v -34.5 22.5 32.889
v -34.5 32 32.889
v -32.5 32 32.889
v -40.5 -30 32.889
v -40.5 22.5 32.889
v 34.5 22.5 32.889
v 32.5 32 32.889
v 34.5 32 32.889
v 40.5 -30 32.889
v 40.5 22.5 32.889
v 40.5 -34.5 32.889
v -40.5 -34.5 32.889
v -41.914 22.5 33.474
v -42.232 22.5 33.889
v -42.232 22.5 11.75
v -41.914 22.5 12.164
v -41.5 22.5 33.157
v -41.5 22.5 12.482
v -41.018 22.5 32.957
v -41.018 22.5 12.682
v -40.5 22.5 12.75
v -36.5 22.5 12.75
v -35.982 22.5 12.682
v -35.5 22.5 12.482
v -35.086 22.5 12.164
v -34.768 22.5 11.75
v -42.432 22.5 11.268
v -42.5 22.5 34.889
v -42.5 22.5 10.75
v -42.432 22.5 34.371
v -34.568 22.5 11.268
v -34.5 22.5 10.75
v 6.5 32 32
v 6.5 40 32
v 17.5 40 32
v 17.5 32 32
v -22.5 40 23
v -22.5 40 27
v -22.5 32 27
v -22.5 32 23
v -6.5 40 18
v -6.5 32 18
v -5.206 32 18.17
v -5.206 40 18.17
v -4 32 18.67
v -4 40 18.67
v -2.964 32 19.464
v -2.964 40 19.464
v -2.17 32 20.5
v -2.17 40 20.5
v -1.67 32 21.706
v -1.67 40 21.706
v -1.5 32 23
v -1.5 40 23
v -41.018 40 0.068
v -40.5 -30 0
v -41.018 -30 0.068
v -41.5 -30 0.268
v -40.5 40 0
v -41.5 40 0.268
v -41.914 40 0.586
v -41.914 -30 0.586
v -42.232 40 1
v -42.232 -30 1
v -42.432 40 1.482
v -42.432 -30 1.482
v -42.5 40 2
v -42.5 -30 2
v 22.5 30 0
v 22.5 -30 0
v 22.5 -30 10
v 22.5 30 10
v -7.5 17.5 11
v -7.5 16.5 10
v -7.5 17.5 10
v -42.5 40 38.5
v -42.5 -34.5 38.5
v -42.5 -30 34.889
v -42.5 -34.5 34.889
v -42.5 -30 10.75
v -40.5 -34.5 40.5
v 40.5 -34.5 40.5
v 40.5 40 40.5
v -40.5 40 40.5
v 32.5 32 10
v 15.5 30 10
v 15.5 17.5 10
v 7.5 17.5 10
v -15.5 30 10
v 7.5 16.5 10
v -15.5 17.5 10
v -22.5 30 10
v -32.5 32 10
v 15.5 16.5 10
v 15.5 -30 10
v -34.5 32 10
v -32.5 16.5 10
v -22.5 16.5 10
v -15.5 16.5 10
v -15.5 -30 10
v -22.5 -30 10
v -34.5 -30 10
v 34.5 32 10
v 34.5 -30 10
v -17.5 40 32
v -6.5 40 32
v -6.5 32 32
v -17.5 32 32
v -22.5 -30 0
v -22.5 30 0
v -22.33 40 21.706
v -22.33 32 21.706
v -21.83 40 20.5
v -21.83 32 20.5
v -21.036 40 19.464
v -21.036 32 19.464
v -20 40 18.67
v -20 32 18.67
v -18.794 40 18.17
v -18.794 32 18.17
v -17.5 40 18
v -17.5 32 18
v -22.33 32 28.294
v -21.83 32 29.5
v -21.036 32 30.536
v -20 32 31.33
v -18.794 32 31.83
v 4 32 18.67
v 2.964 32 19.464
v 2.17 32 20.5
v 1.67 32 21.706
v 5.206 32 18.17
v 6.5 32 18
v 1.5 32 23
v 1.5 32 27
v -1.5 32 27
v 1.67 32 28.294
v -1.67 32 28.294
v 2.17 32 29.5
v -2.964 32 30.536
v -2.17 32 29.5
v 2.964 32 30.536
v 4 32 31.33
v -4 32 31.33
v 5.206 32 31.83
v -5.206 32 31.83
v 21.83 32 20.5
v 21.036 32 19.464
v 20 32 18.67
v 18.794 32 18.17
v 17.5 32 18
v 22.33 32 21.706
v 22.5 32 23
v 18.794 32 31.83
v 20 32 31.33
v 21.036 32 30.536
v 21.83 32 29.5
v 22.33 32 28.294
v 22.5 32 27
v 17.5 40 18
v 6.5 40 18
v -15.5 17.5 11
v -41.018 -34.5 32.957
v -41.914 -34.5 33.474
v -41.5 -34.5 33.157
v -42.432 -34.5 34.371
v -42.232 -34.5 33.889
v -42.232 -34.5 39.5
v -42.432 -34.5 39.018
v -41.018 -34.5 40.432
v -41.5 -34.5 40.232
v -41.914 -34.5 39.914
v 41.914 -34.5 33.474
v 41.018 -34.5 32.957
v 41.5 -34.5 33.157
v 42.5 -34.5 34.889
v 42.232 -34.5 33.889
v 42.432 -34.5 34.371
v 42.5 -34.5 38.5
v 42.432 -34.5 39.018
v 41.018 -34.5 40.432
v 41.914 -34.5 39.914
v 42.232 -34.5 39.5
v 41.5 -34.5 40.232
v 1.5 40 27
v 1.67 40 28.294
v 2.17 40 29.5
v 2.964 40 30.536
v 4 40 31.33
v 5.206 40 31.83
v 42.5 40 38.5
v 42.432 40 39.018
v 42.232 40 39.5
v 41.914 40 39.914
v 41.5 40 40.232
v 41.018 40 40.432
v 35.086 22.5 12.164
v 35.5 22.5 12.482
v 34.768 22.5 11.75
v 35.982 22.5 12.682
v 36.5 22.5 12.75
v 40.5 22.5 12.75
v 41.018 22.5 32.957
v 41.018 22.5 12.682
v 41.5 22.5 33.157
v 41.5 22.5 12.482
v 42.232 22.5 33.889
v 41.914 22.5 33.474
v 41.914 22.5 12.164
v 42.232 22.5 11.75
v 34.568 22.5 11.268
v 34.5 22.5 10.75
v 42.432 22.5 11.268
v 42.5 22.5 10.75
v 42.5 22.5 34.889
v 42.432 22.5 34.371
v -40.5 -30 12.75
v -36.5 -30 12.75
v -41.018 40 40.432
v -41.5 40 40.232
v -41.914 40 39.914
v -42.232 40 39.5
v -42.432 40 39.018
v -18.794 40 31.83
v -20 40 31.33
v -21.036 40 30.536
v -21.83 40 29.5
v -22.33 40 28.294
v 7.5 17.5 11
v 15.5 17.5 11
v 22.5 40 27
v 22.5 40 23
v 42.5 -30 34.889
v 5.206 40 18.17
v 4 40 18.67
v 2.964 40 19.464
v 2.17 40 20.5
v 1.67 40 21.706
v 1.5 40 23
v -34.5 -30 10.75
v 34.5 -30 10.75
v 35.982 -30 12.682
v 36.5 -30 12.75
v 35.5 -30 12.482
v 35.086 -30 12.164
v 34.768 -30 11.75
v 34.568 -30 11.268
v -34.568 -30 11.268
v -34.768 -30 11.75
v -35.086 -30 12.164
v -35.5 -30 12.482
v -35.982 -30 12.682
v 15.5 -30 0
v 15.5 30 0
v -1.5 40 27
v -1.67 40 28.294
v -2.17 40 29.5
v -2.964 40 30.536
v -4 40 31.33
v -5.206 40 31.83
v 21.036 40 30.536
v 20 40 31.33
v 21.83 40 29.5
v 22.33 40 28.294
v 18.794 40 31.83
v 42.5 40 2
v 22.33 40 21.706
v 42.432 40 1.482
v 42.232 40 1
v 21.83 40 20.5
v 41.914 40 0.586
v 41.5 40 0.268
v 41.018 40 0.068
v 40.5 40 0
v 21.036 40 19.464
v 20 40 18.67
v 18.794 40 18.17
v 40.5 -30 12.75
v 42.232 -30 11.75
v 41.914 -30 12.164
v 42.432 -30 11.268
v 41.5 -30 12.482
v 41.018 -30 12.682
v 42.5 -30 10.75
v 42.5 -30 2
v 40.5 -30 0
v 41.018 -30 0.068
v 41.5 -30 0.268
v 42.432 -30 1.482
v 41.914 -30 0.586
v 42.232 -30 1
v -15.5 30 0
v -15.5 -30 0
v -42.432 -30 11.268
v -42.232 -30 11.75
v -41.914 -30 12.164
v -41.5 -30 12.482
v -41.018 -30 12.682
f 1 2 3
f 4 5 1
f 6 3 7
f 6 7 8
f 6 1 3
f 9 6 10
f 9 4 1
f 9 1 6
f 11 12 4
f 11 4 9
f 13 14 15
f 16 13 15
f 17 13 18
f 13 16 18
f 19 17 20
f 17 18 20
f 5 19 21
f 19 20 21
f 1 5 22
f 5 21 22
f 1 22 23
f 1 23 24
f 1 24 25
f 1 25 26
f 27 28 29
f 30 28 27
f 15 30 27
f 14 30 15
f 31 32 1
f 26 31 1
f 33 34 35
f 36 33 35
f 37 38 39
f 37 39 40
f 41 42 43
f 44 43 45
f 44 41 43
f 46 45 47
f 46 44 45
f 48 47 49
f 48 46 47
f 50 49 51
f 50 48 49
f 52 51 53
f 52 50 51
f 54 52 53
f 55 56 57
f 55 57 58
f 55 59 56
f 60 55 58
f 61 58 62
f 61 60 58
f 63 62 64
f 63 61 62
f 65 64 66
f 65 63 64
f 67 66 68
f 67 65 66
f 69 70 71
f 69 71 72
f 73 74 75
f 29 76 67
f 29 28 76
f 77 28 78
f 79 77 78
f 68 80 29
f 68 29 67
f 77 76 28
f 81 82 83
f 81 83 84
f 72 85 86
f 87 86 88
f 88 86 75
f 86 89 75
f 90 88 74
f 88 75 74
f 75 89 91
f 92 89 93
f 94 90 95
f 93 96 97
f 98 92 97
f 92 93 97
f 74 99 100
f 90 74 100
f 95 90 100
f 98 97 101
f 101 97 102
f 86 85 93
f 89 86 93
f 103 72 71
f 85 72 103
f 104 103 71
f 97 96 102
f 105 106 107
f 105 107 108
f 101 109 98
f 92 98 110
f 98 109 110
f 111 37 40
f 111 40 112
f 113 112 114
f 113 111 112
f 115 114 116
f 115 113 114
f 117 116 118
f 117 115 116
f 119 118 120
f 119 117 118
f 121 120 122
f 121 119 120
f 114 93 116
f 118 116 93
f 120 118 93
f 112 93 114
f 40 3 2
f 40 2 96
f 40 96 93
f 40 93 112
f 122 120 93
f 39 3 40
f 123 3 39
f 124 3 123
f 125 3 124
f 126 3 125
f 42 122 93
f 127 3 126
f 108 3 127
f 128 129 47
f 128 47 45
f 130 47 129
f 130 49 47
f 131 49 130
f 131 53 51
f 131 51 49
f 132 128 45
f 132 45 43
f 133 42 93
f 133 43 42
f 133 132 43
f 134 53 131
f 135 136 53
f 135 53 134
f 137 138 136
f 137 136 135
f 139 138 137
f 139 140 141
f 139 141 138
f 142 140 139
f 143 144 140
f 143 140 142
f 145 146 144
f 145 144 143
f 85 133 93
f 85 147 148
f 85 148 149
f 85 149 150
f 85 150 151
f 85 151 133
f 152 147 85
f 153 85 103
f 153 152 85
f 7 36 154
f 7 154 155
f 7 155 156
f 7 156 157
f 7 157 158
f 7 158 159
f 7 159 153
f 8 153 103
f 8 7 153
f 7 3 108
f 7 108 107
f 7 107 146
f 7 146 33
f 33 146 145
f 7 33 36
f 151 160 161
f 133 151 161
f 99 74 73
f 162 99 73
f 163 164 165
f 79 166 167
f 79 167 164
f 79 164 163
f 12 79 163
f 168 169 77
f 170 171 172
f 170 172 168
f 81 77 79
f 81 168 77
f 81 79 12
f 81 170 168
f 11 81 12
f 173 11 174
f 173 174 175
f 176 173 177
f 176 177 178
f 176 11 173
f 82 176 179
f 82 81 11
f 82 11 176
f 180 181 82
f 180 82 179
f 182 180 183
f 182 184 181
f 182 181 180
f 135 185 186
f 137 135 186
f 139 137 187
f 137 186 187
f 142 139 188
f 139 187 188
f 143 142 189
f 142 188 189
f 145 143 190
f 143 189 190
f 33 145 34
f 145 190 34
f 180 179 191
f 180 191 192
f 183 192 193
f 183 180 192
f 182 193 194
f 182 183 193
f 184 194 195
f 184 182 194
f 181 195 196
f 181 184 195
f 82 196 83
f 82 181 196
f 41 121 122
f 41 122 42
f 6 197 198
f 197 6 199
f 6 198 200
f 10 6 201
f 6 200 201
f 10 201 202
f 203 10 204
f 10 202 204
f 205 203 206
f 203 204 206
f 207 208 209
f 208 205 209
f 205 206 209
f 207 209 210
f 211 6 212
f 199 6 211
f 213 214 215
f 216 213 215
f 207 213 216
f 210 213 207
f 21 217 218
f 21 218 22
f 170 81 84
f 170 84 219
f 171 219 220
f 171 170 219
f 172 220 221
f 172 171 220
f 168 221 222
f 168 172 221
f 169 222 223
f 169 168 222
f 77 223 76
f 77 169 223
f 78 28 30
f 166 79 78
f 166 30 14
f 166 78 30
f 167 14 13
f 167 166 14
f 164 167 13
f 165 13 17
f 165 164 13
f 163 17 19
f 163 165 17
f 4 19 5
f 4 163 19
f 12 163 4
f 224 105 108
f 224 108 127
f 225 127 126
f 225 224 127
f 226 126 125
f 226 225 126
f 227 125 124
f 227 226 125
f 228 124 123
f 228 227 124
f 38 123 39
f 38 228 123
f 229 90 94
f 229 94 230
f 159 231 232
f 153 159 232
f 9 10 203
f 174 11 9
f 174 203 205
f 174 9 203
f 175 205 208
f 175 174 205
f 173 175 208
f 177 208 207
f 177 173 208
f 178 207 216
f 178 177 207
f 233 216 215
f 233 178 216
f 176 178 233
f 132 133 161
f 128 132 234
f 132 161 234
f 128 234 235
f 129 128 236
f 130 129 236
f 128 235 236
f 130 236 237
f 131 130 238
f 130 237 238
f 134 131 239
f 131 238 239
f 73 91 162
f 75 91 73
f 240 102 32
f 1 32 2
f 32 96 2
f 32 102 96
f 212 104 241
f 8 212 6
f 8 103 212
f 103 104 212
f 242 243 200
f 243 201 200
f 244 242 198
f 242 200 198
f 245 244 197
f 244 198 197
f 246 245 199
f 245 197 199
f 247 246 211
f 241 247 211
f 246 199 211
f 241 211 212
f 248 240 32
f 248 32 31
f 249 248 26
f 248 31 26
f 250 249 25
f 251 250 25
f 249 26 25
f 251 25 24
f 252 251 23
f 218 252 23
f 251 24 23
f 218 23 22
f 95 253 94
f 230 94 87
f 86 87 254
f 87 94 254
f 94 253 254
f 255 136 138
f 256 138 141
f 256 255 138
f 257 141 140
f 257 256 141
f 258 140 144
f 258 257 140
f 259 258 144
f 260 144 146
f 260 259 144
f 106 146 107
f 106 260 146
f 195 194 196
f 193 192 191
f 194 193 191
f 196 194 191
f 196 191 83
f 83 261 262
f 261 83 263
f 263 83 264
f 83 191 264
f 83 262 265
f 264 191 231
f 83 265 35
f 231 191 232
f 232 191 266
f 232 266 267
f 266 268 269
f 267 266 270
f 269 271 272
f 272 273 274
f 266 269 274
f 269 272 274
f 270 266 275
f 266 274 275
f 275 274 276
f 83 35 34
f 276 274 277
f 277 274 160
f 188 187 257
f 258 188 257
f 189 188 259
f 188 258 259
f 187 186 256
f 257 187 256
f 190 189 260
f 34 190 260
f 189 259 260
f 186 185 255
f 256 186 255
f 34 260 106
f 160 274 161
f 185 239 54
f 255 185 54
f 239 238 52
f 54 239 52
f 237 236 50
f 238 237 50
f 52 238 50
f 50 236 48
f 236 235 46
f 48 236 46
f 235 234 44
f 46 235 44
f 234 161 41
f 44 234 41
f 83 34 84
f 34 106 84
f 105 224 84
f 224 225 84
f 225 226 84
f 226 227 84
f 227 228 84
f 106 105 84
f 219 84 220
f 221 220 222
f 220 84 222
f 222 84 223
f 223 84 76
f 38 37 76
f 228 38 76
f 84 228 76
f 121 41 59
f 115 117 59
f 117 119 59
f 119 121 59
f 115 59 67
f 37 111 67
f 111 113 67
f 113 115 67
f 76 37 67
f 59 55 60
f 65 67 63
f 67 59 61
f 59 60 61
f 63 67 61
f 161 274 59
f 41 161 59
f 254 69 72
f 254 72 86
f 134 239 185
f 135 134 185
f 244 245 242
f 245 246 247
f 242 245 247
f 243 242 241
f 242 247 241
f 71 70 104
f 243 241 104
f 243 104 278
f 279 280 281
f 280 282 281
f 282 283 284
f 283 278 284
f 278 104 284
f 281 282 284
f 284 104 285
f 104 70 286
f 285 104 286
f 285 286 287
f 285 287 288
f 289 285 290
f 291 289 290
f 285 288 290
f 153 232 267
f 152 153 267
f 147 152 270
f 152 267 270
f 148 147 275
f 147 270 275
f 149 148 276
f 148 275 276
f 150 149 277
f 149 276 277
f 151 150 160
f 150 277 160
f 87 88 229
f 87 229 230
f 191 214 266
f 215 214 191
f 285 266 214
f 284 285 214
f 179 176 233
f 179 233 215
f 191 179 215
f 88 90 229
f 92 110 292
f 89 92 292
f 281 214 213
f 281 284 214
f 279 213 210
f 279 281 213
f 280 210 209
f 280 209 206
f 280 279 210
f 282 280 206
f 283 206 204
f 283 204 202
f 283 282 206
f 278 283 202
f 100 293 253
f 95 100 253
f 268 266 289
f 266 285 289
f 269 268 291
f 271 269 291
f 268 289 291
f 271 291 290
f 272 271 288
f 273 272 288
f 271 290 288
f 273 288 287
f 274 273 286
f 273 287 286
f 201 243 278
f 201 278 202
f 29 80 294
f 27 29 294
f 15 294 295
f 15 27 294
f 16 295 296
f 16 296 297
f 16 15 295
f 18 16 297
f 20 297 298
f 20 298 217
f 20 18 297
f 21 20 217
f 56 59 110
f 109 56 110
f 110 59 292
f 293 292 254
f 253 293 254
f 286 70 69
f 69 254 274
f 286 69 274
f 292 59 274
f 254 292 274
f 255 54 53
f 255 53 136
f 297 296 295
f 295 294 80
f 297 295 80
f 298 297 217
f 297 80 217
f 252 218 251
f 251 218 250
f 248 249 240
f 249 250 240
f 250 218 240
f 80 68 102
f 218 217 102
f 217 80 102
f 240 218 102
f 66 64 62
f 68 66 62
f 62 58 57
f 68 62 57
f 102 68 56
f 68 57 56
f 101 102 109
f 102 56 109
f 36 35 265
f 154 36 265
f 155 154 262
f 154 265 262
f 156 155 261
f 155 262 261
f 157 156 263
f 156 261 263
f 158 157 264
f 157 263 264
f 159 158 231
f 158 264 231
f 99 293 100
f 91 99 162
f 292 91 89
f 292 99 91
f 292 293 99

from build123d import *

# Parameters (mm, degrees)
SKETCH1_W               = 65
SKETCH1_H               = 60
BOSS_EXTRUDE1_DEPTH     = 10
SKETCH6_W               = 10
SKETCH6_H               = 1
BOSS_EXTRUDE6_DEPTH     = 1
CUT_EXTRUDE2_DEPTH      = 1
CUT_EXTRUDE2_DEPTH_BACK = 73.945184899
BOSS_EXTRUDE2_DEPTH     = 33
SKETCH2_W               = 20.25
SKETCH2_H               = 52.5
CUT_EXTRUDE1_DEPTH      = 100.569071503
BOSS_EXTRUDE3_DEPTH     = 7.5
SKETCH5_W               = 85
SKETCH5_H               = 7.611423687
BOSS_EXTRUDE5_DEPTH     = 70
SKETCH8_W               = 65
SKETCH8_H               = 22.888576313
CUT_EXTRUDE3_DEPTH      = 2
CUT_EXTRUDE4_DEPTH      = 2
SKETCH11_W              = 7
SKETCH11_H              = 60
CUT_EXTRUDE5_DEPTH      = 12.75
CUT_EXTRUDE6_REACH      = 93.359
SKETCH10_W              = 15
SKETCH10_H              = 8
FILLET1_R               = 2
BOSS_EXTRUDE7_START     = 4.5
BOSS_EXTRUDE7_DEPTH     = 4.5
CUT_EXTRUDE8_REACH      = 96.851


with BuildPart() as part:
    # Sketch1 → Boss-Extrude1 (new body)
    with BuildSketch(Plane.XY):
        Rectangle(SKETCH1_W, SKETCH1_H)
        Polygon((32.5, -30), (32.5, 30), (-32.5, 30), (-32.5, -30), (-42.5, -30), (-42.5, 40), (42.5, 40), (42.5, -30), align=None)
    extrude(amount=BOSS_EXTRUDE1_DEPTH)

    # Sketch6 → Boss-Extrude6 (add)
    with BuildSketch(Plane.XY.offset(10)):
        with Locations((12.5, 17)):
            Rectangle(SKETCH6_W, SKETCH6_H)
        with Locations((-12.5, 17)):
            Rectangle(SKETCH6_W, SKETCH6_H)
    extrude(amount=BOSS_EXTRUDE6_DEPTH)

    # Sketch7 → Cut-Extrude2 (cut, two sides: drawn at the far end of the back side and taken through both)
    with BuildSketch(Plane(origin=(17.5, 0, 0), x_dir=(0, 0, -1), z_dir=(1, 0, 0)).offset(-CUT_EXTRUDE2_DEPTH_BACK)):
        Polygon((-10, 16.5), (-11, 17.5), (-11, 16.5), align=None)
    extrude(amount=CUT_EXTRUDE2_DEPTH + CUT_EXTRUDE2_DEPTH_BACK, mode=Mode.SUBTRACT)

    # Sketch1<3> → Boss-Extrude2 (add)
    with BuildSketch(Plane.XY):
        Polygon((32.5, -30), (32.5, 30), (-32.5, 30), (-32.5, -30), (-42.5, -30), (-42.5, 40), (42.5, 40), (42.5, -30), align=None)
    extrude(amount=BOSS_EXTRUDE2_DEPTH)

    # Sketch2 → Cut-Extrude1 (cut, through all)
    with BuildSketch(Plane.ZY.offset(42.5)):
        with Locations((22.875, -3.75)):
            Rectangle(SKETCH2_W, SKETCH2_H)
    extrude(amount=-CUT_EXTRUDE1_DEPTH, mode=Mode.SUBTRACT)

    # Sketch3 → Boss-Extrude3 (add)
    with BuildSketch(Plane.XY.offset(33)):
        Polygon((32.5, 22.5), (42.5, 22.5), (42.5, 40), (-42.5, 40), (-42.5, 22.5), (-32.5, 22.5), (-32.5, 30), (32.5, 30), align=None)
    extrude(amount=BOSS_EXTRUDE3_DEPTH)

    # Sketch5 → Boss-Extrude5 (add)
    with BuildSketch(Plane(origin=(0, 40, 0), x_dir=(1, 0, 0), z_dir=(0, 1, 0))):
        with Locations((0, -36.694288157)):
            Rectangle(SKETCH5_W, SKETCH5_H)
    extrude(amount=-BOSS_EXTRUDE5_DEPTH)

    # Sketch8 → Cut-Extrude3 (cut)
    with BuildSketch(Plane.XZ.offset(-30)):
        with Locations((0, 21.444288157)):
            Rectangle(SKETCH8_W, SKETCH8_H)
    extrude(amount=-CUT_EXTRUDE3_DEPTH, mode=Mode.SUBTRACT)

    # Sketch9 → Cut-Extrude4 (cut)
    with BuildSketch(Plane.ZY.offset(-32.5)):
        Polygon((32.888576313, 22.5), (32.888576313, 32), (10, 32), (10, -30), (12.75, -30), (12.75, 22.5), align=None)
    cut_extrude4 = extrude(amount=-CUT_EXTRUDE4_DEPTH, mode=Mode.SUBTRACT)

    # Mirror1: Cut-Extrude4 across plane
    add(cut_extrude4.mirror(Plane(origin=(0, 0, 0), x_dir=(0, 0, 1), z_dir=(1, 0, 0))), mode=Mode.SUBTRACT)

    # Sketch11 → Cut-Extrude5 (cut)
    with BuildSketch(Plane(origin=(0, 0, 0), x_dir=(-1, 0, 0), z_dir=(0, 0, -1))):
        with Locations((-19, 0)):
            Rectangle(SKETCH11_W, SKETCH11_H)
    cut_extrude5 = extrude(amount=-CUT_EXTRUDE5_DEPTH, mode=Mode.SUBTRACT)

    # Mirror2: Cut-Extrude5 across plane
    add(cut_extrude5.mirror(Plane(origin=(0, 0, 0), x_dir=(0, 0, 1), z_dir=(1, 0, 0))), mode=Mode.SUBTRACT)

    # Sketch10 → Cut-Extrude6 (cut, up to next)
    with BuildSketch(Plane(origin=(0, 40, 0), x_dir=(1, 0, 0), z_dir=(0, 1, 0)), mode=Mode.PRIVATE) as cut_extrude6_sk1:
        with Locations((12, -25)):
            Rectangle(SKETCH10_W, SKETCH10_H)
    cut_extrude6_tool1 = extrude(cut_extrude6_sk1.sketch, amount=-CUT_EXTRUDE6_REACH, mode=Mode.PRIVATE) & part.part
    cut_extrude6 = cut_extrude6_tool1.solids().sort_by_distance((12, 40, 25))[0]
    add(cut_extrude6, mode=Mode.SUBTRACT)

    # Mirror4: Cut-Extrude6 across plane
    add(cut_extrude6.mirror(Plane(origin=(0, 0, 0), x_dir=(0, 0, 1), z_dir=(1, 0, 0))), mode=Mode.SUBTRACT)

    # Fillet1
    fillet1_edges = [part.edges().sort_by_distance(p)[0] for p in [
        (42.5, -3.75, 12.75),
        (-42.5, -3.75, 12.75),
        (42.5, 5, 40.5),
        (-42.5, 5, 40.5),
        (-42.5, -3.75, 32.888576313),
        (42.5, -3.75, 32.888576313),
        (34.5, -3.75, 12.75),
        (-34.5, -3.75, 12.75),
        (4.5, 36, 29),
        (4.5, 36, 21),
        (19.5, 36, 21),
        (19.5, 36, 29),
        (-4.5, 36, 21),
        (-4.5, 36, 29),
        (-19.5, 36, 29),
        (-19.5, 36, 21),
        (-42.5, 5, 0),
        (42.5, 5, 0),
    ]]
    fillet(fillet1_edges, radius=FILLET1_R)

    # Sketch12 → Boss-Extrude7 (add)
    with BuildSketch(Plane.XZ.offset(30).offset(BOSS_EXTRUDE7_START)):
        with BuildLine():
            Line((-42.5, 38.5), (-42.5, 34.888576313))
            ThreePointArc((-42.5, 34.888576313), (-41.914213562, 33.474362751), (-40.5, 32.888576313))
            Line((-40.5, 32.888576313), (40.5, 32.888576313))
            ThreePointArc((40.5, 32.888576313), (41.914213562, 33.474362751), (42.5, 34.888576313))
            Line((42.5, 34.888576313), (42.5, 38.5))
            ThreePointArc((42.5, 38.5), (41.914213562, 39.914213562), (40.5, 40.5))
            Line((40.5, 40.5), (-40.5, 40.5))
            ThreePointArc((-40.5, 40.5), (-41.914213562, 39.914213562), (-42.5, 38.5))
        make_face()
    extrude(amount=-BOSS_EXTRUDE7_DEPTH)

    # Sketch14 → Cut-Extrude8 (cut, up to next)
    with BuildSketch(Plane(origin=(0, 40, 0), x_dir=(1, 0, 0), z_dir=(0, 1, 0)), mode=Mode.PRIVATE) as cut_extrude8_sk1:
        with BuildLine():
            Line((17.5, -18), (6.5, -18))
            ThreePointArc((6.5, -18), (2.964466094, -19.464466094), (1.5, -23))
            Line((1.5, -23), (1.5, -27))
            ThreePointArc((1.5, -27), (2.964466094, -30.535533906), (6.5, -32))
            Line((6.5, -32), (17.5, -32))
            ThreePointArc((17.5, -32), (21.035533906, -30.535533906), (22.5, -27))
            Line((22.5, -27), (22.5, -23))
            ThreePointArc((22.5, -23), (21.035533906, -19.464466094), (17.5, -18))
        make_face()
        with BuildLine():
            Line((19.5, -27), (19.5, -23))
            ThreePointArc((19.5, -23), (18.914213562, -21.585786438), (17.5, -21))
            Line((17.5, -21), (6.5, -21))
            ThreePointArc((6.5, -21), (5.085786438, -21.585786438), (4.5, -23))
            Line((4.5, -23), (4.5, -27))
            ThreePointArc((4.5, -27), (5.085786438, -28.414213562), (6.5, -29))
            Line((6.5, -29), (17.5, -29))
            ThreePointArc((17.5, -29), (18.914213562, -28.414213562), (19.5, -27))
        make_face(mode=Mode.SUBTRACT)
    cut_extrude8_tool1 = extrude(cut_extrude8_sk1.sketch, amount=-CUT_EXTRUDE8_REACH, mode=Mode.PRIVATE) & part.part
    # Sketch14 → Cut-Extrude8 (cut, up to next)
    with BuildSketch(Plane(origin=(0, 40, 0), x_dir=(1, 0, 0), z_dir=(0, 1, 0)), mode=Mode.PRIVATE) as cut_extrude8_sk2:
        with BuildLine():
            Line((-1.5, -23), (-1.5, -27))
            ThreePointArc((-1.5, -27), (-2.964466094, -30.535533906), (-6.5, -32))
            Line((-6.5, -32), (-17.5, -32))
            ThreePointArc((-17.5, -32), (-21.035533906, -30.535533906), (-22.5, -27))
            Line((-22.5, -27), (-22.5, -23))
            ThreePointArc((-22.5, -23), (-21.035533906, -19.464466094), (-17.5, -18))
            Line((-17.5, -18), (-6.5, -18))
            ThreePointArc((-6.5, -18), (-2.964466094, -19.464466094), (-1.5, -23))
        make_face()
        with BuildLine():
            Line((-6.5, -29), (-17.5, -29))
            ThreePointArc((-17.5, -29), (-18.914213562, -28.414213562), (-19.5, -27))
            Line((-19.5, -27), (-19.5, -23))
            ThreePointArc((-19.5, -23), (-18.914213562, -21.585786438), (-17.5, -21))
            Line((-17.5, -21), (-6.5, -21))
            ThreePointArc((-6.5, -21), (-5.085786438, -21.585786438), (-4.5, -23))
            Line((-4.5, -23), (-4.5, -27))
            ThreePointArc((-4.5, -27), (-5.085786438, -28.414213562), (-6.5, -29))
        make_face(mode=Mode.SUBTRACT)
    cut_extrude8_tool2 = extrude(cut_extrude8_sk2.sketch, amount=-CUT_EXTRUDE8_REACH, mode=Mode.PRIVATE) & part.part
    add(cut_extrude8_tool1.solids().sort_by_distance((12, 40, 18.252389))[0], mode=Mode.SUBTRACT)
    add(cut_extrude8_tool2.solids().sort_by_distance((-1.752389, 40, 25))[0], mode=Mode.SUBTRACT)


solid = part.part
